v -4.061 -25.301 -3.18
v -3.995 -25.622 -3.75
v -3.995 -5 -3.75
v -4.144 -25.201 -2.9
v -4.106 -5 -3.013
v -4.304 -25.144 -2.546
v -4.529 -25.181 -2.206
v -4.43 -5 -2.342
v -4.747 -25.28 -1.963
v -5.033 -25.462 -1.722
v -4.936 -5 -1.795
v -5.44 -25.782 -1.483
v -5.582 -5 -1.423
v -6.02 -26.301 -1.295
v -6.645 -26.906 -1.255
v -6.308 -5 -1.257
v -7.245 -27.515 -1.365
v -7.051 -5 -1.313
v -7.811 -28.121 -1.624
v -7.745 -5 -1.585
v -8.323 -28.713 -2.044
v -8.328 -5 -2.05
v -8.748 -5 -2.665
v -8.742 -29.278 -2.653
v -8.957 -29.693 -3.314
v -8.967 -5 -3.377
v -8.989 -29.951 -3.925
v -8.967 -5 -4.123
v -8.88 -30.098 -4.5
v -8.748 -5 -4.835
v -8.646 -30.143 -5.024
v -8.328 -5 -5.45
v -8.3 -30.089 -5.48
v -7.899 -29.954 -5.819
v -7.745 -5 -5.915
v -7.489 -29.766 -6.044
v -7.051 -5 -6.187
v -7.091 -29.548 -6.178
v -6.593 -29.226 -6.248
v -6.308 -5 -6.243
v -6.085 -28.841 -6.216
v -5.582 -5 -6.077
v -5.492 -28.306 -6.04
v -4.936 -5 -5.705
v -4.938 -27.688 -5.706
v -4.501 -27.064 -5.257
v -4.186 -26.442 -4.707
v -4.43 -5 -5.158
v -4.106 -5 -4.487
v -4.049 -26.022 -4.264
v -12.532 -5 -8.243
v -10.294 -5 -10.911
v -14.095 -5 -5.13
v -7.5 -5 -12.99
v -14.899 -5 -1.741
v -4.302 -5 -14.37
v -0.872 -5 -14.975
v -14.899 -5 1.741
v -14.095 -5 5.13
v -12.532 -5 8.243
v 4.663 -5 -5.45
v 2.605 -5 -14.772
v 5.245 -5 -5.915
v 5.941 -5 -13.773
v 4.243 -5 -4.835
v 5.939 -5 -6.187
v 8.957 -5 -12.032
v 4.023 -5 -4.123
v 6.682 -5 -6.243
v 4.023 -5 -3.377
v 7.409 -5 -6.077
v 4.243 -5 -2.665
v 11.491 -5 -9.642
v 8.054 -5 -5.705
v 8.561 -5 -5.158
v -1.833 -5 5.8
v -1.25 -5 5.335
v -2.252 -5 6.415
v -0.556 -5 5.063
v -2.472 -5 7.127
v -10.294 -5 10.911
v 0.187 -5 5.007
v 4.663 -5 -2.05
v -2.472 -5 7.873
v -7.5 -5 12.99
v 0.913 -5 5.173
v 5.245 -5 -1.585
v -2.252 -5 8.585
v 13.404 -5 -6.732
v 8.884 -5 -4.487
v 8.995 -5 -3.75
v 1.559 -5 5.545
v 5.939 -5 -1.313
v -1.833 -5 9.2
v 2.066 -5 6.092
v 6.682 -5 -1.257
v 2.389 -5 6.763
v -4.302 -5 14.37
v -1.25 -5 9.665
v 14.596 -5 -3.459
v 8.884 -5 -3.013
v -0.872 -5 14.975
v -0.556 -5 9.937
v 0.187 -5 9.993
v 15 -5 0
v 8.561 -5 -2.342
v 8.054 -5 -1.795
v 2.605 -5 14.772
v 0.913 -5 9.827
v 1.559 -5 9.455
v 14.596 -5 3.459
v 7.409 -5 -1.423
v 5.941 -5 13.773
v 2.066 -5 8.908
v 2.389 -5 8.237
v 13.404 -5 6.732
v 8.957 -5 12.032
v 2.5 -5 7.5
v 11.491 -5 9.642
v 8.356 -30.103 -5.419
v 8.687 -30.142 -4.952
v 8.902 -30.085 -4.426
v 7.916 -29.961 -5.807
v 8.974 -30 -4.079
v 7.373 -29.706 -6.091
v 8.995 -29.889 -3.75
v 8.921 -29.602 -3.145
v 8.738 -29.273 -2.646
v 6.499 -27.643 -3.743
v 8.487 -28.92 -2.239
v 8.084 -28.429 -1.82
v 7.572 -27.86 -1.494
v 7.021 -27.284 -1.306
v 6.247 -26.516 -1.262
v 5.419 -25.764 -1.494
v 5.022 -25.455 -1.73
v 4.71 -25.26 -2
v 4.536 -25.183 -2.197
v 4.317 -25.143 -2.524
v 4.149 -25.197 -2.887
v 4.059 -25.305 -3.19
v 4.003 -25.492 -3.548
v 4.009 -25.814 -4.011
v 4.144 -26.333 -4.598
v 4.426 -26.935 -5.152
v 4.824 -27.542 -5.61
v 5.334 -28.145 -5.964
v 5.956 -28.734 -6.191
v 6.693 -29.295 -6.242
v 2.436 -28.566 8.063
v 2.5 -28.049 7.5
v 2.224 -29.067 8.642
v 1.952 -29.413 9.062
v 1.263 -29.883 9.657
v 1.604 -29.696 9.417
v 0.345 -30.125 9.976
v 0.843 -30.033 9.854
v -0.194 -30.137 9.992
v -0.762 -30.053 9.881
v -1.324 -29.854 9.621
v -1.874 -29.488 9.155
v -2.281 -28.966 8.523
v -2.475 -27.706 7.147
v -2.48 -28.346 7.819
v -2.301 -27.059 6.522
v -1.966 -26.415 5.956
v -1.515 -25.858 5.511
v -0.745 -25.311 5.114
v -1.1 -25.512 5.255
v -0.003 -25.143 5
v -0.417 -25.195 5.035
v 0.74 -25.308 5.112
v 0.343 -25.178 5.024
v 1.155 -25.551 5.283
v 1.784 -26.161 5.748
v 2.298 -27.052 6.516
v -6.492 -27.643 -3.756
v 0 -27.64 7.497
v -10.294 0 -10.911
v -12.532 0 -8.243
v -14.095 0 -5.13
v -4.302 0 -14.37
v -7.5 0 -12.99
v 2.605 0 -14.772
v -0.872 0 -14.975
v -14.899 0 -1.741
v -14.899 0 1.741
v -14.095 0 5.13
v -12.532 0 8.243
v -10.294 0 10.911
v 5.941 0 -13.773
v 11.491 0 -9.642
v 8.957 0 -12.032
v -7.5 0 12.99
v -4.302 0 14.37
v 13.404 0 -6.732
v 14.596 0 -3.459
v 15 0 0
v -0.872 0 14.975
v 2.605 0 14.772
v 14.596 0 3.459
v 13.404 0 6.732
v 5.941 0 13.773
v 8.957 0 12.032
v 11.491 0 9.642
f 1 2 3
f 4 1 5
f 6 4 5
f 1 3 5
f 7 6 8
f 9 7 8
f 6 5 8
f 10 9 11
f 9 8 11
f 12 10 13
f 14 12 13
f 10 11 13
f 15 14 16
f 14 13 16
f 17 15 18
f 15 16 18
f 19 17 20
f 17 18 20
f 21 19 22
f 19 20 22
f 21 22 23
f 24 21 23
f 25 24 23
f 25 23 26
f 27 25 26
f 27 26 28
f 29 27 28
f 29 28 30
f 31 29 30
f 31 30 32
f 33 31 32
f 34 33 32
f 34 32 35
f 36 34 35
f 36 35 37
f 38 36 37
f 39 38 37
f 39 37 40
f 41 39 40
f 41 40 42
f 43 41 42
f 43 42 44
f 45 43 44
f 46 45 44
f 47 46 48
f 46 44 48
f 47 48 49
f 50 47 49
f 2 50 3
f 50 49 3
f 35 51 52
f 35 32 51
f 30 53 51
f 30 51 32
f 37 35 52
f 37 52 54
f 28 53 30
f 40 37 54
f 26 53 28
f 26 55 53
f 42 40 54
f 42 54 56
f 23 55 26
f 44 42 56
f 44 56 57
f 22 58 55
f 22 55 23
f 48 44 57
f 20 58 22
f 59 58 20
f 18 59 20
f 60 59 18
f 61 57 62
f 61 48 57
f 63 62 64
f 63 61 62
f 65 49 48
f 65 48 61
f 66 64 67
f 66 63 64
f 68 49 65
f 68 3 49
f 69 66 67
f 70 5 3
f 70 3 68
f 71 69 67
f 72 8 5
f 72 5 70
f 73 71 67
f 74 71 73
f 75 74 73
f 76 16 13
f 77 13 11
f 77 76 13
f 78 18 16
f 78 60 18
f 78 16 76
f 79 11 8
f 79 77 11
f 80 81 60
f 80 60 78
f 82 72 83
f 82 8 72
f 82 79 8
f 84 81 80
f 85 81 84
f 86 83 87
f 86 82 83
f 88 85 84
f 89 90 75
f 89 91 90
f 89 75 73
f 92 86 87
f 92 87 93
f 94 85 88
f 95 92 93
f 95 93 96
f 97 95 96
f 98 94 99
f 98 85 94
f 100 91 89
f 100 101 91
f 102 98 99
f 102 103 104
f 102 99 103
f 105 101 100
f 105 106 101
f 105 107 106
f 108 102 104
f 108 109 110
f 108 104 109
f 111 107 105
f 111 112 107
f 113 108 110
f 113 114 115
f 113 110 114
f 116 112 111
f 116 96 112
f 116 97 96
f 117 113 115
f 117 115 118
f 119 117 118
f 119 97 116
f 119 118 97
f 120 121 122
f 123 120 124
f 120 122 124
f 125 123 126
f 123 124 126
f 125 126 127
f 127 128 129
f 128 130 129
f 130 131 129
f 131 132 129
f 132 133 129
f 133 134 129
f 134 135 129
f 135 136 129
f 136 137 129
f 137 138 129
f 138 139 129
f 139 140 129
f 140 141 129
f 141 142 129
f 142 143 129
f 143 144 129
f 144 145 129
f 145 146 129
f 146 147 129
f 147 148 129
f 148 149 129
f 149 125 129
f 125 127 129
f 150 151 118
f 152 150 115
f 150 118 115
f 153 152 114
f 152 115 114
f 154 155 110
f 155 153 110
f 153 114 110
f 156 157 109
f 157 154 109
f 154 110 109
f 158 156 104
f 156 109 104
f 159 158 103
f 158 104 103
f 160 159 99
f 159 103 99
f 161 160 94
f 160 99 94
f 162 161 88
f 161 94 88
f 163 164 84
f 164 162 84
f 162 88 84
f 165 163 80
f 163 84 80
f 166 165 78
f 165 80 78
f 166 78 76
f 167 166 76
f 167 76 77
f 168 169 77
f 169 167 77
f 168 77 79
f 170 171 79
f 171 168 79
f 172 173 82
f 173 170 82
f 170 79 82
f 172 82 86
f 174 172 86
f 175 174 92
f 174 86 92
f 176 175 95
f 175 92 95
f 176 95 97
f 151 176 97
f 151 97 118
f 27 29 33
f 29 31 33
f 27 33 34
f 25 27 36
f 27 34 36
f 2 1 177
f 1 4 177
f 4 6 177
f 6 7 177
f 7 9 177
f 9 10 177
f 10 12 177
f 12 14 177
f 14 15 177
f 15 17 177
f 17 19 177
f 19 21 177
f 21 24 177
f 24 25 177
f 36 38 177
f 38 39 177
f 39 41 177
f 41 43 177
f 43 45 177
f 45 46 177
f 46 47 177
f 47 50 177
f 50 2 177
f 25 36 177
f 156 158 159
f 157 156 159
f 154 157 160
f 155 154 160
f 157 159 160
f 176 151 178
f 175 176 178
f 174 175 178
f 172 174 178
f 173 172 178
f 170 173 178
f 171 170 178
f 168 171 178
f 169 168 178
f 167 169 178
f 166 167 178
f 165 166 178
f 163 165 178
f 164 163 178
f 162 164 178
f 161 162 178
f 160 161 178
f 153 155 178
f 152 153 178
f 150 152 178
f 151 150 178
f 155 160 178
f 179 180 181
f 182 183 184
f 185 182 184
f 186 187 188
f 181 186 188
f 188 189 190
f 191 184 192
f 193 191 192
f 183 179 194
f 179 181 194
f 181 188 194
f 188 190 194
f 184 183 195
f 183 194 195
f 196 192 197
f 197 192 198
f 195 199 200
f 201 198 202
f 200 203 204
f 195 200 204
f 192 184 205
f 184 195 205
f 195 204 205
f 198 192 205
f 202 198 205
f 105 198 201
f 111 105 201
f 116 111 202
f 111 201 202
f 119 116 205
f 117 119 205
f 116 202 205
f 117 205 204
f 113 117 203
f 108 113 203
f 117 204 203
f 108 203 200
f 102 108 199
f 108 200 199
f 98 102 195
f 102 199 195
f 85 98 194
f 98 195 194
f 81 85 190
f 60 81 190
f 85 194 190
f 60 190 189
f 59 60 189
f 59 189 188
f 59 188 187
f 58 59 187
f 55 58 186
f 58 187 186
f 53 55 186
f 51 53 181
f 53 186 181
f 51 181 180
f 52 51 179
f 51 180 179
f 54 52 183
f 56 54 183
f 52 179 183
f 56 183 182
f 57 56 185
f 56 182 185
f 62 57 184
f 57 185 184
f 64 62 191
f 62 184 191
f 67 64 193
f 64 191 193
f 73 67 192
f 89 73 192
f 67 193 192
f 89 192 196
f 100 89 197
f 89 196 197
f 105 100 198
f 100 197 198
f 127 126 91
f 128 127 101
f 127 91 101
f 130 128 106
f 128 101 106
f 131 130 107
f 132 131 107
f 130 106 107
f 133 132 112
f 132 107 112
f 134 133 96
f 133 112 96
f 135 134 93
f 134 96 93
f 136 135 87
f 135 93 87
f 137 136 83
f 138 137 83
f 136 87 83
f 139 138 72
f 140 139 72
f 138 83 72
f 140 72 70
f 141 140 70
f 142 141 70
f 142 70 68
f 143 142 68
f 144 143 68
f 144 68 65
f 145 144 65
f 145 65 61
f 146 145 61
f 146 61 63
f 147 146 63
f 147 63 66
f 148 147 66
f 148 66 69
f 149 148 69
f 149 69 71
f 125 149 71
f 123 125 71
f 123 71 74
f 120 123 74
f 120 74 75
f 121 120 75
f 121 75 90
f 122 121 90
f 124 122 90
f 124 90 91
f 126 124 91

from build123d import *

# Parameters (mm, degrees)
F0_R     = 15
F1_DEPTH = 5
F2_R     = 2.5
F3_DEPTH = 25.4


with BuildPart() as f1:
    # F0 (on Front) → F1 (new body)
    with BuildSketch(Plane.XZ):
        Circle(F0_R)
    extrude(amount=F1_DEPTH)

    # F2 (on face) → F3 (join)
    with BuildSketch(Plane.XZ.offset(5)):
        with Locations((-6.495191, -3.75)):
            Circle(F2_R)
        with Locations((0, 7.5)):
            Circle(F2_R)
        with Locations((6.495191, -3.75)):
            Circle(F2_R)
    extrude(amount=F3_DEPTH)

    # F4 (on Right) → F5 (revolve, cut)
    with BuildSketch(Plane.YZ):
        Polygon((-20.142939, 0), (-30.415036, 10.272097), (-30.415036, 0), align=None)
    revolve(axis=Axis((0, -21.627579, 0), (0, -1, 0)), mode=Mode.SUBTRACT)


solid = f1.part
